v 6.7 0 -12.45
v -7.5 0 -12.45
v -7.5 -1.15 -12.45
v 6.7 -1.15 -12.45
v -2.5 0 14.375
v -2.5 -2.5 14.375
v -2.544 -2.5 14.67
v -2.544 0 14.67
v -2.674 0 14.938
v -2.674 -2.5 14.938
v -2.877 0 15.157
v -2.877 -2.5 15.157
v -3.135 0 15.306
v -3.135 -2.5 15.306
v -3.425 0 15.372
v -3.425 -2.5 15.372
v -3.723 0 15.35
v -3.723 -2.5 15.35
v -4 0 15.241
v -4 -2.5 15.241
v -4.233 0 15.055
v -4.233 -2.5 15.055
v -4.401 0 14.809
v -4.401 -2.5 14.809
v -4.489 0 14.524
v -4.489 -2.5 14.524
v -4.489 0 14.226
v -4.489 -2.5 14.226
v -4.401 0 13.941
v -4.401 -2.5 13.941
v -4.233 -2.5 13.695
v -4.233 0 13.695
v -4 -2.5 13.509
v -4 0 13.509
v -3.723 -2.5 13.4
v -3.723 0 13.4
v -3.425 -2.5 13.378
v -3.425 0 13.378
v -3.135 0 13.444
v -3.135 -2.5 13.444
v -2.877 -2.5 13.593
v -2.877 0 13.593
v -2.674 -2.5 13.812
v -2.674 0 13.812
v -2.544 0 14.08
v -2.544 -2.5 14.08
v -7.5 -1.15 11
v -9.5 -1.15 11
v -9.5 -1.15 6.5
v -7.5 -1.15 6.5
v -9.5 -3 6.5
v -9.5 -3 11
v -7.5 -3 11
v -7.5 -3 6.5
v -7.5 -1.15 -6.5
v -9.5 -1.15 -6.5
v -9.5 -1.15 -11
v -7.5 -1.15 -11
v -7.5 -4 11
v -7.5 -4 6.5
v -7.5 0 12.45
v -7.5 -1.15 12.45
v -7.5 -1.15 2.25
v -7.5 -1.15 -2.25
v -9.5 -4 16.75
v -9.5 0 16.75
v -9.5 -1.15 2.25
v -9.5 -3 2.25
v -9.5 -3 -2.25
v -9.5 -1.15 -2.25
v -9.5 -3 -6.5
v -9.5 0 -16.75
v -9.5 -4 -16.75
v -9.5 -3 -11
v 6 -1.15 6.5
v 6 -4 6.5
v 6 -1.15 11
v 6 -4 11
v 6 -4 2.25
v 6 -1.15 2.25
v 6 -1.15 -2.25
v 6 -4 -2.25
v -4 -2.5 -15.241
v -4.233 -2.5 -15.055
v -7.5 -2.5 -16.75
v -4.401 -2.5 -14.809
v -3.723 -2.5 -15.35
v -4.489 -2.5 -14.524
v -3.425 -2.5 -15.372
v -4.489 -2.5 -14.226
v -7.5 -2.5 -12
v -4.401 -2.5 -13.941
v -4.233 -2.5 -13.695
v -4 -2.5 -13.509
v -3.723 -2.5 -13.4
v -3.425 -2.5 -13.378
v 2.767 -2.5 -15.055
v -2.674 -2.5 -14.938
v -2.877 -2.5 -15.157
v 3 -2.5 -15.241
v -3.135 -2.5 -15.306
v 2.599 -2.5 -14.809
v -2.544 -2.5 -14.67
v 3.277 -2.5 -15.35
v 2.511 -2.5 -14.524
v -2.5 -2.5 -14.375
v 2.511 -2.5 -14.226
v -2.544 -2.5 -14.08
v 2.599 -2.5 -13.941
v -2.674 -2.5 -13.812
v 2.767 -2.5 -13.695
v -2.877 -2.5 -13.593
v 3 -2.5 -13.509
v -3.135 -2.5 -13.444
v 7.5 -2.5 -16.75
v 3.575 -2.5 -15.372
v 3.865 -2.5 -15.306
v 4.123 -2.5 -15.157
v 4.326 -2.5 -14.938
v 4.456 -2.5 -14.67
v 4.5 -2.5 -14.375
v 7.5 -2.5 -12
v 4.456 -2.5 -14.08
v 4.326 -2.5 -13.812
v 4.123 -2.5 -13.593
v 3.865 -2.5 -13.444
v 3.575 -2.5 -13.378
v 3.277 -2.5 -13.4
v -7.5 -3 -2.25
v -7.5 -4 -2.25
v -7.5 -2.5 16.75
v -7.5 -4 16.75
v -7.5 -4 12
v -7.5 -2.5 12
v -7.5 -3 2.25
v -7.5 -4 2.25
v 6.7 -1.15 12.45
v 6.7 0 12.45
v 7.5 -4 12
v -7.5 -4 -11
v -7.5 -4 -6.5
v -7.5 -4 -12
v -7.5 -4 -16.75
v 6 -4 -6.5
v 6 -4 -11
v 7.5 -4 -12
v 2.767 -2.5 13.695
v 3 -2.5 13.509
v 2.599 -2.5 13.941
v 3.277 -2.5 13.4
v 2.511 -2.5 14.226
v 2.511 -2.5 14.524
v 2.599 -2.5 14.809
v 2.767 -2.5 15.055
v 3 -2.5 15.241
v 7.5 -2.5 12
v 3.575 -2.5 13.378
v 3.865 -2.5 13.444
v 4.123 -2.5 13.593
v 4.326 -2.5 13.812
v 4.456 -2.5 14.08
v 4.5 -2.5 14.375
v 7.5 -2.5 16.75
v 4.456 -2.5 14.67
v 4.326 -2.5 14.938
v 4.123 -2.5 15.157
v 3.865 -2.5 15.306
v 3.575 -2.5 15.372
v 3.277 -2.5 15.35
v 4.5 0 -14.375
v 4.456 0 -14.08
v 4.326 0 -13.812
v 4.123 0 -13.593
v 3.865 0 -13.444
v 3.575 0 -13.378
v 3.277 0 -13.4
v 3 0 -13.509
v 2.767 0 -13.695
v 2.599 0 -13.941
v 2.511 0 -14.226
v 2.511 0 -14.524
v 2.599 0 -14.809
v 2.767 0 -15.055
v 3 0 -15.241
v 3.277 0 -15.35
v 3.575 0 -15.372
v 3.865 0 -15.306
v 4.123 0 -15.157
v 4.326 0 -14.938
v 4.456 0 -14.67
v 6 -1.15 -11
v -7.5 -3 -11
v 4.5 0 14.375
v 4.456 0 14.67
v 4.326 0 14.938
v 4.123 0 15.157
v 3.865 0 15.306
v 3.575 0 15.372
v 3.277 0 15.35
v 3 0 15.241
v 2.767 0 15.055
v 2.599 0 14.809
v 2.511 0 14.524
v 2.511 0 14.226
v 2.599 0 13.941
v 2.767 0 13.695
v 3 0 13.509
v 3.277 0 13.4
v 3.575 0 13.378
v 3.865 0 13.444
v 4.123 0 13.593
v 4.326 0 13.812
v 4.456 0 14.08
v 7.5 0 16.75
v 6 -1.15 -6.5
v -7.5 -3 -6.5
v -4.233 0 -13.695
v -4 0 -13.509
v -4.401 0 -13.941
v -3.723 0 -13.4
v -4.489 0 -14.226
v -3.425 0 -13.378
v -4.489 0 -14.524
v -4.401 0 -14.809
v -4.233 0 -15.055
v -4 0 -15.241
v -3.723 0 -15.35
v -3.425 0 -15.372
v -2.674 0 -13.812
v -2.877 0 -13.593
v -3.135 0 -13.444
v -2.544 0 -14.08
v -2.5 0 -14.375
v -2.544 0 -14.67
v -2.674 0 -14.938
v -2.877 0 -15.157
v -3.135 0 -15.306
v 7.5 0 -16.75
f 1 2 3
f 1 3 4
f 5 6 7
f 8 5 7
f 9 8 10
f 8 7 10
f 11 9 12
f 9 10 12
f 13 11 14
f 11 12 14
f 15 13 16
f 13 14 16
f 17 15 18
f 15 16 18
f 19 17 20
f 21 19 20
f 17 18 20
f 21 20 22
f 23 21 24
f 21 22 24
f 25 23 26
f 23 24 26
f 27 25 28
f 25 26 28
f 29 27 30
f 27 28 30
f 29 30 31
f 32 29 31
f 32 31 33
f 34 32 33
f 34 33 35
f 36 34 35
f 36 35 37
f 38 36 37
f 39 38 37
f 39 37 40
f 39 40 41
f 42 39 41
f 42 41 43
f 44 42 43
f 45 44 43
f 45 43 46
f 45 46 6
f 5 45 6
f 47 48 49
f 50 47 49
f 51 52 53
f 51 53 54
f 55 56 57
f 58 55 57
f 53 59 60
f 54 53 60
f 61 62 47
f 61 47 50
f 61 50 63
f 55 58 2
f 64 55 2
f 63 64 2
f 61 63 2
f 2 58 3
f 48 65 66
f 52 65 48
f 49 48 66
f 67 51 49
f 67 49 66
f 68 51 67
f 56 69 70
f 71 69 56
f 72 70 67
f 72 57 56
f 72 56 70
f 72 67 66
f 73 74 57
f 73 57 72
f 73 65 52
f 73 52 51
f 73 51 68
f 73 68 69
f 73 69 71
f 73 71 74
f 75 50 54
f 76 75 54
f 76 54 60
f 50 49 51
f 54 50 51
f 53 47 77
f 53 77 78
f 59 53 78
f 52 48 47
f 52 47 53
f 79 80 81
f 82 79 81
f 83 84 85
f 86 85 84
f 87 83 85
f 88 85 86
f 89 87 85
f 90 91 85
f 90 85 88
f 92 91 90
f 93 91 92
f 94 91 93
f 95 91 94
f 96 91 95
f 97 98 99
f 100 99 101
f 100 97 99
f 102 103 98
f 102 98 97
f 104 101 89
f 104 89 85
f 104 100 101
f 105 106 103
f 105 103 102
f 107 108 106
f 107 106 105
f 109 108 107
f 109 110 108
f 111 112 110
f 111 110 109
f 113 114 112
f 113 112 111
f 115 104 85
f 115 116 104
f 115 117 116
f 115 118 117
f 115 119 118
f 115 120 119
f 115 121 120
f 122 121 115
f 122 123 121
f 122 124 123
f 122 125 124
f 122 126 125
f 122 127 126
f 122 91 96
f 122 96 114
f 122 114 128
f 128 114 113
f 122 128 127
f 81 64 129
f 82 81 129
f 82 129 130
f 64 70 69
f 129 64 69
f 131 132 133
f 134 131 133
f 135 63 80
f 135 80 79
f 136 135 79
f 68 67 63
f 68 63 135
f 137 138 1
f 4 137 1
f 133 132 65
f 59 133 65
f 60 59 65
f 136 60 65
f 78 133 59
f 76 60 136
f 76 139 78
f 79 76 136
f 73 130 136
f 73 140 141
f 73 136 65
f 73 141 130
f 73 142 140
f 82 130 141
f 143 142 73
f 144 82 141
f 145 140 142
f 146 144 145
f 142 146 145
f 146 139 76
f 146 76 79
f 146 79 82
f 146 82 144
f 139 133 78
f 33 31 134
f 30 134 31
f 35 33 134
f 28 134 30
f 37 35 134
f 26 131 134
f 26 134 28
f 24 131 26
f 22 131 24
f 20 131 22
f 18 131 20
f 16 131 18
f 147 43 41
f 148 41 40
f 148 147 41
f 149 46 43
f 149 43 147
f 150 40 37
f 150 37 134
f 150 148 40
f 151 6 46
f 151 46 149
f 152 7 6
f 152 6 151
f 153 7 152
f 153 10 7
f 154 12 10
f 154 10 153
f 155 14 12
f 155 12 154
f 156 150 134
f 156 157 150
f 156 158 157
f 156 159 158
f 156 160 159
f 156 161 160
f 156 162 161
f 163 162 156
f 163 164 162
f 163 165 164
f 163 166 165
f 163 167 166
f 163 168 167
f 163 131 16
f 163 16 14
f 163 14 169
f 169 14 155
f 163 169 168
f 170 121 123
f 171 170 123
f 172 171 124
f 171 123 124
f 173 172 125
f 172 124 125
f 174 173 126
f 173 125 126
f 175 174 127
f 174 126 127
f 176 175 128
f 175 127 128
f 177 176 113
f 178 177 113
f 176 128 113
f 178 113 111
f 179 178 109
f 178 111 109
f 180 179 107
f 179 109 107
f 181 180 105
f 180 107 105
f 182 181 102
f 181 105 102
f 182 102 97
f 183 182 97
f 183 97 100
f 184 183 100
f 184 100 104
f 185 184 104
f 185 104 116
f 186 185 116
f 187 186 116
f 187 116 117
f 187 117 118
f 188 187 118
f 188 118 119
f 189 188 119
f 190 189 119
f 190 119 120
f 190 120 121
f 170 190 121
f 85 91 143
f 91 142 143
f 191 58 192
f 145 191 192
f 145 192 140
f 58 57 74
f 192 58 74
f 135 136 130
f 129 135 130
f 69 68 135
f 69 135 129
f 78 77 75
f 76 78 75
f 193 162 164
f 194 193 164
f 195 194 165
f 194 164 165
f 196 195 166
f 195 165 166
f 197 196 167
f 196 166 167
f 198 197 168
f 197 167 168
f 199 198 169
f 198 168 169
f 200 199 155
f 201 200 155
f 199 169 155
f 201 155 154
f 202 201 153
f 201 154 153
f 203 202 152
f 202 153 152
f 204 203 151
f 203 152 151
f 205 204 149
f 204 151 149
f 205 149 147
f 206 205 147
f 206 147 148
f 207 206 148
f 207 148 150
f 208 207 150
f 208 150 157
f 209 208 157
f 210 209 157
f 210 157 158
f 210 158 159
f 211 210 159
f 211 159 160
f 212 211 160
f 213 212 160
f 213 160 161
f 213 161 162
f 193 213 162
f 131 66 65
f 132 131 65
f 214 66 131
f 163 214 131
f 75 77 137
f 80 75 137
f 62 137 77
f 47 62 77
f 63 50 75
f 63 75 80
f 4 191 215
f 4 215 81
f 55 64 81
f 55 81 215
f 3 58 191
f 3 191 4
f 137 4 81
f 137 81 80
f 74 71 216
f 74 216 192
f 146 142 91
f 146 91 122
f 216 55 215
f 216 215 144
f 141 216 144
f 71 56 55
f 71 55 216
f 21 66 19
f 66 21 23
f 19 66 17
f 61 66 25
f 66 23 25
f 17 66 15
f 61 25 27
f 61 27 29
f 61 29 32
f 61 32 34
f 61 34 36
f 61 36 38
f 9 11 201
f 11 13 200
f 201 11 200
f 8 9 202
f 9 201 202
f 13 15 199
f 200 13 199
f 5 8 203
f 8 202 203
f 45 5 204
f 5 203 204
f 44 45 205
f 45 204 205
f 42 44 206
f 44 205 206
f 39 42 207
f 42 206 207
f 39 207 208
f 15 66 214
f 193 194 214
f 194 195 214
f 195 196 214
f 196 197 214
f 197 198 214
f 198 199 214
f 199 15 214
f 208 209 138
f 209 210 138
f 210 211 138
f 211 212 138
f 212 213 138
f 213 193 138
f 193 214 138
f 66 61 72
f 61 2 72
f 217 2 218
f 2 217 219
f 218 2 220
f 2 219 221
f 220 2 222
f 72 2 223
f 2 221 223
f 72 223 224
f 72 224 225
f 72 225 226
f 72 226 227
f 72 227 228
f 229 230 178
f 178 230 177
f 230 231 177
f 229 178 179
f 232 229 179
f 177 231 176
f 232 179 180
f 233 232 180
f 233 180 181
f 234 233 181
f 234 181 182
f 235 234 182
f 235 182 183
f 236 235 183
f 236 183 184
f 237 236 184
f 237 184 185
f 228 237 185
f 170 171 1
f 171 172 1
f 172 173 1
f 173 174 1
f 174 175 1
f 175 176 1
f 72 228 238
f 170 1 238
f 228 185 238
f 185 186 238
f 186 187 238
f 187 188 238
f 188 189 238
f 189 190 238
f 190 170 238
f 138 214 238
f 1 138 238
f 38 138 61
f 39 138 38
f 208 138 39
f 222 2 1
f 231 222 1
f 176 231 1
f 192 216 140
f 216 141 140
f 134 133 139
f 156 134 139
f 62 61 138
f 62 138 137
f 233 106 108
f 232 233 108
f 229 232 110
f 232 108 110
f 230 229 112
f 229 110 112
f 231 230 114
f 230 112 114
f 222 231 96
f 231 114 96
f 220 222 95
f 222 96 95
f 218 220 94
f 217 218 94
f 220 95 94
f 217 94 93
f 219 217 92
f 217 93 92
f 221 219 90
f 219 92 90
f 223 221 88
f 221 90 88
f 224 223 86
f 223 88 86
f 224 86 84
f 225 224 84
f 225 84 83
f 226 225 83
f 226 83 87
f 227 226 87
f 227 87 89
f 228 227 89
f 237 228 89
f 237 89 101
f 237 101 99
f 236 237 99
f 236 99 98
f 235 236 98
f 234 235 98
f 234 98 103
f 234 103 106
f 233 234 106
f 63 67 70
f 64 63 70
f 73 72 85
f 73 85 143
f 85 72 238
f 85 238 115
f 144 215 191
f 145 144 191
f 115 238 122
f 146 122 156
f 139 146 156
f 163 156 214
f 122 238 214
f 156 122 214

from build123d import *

# Parameters (mm, degrees)
SKETCH_W        = 15
SKETCH_H        = 33.5
PAD_DEPTH       = 12
SKETCH001_R     = 1
POCKET_DEPTH    = 12.001
SKETCH002_W     = 24.931972
SKETCH002_H     = 6.15048
SKETCH002_W_2   = 25.150666
SKETCH002_H_2   = 6.153969
POCKET001_DEPTH = 9.5
SKETCH003_W     = 17.12865
SKETCH003_H     = 22.5
POCKET002_DEPTH = 1
SKETCH004_W     = 20.925805
SKETCH004_H     = 24.9
POCKET003_DEPTH = 0.5
SKETCH005_W     = 29.02304
SKETCH005_H     = 9.956954
POCKET004_DEPTH = 15.001
SKETCH006_W     = 24.9
SKETCH006_H     = 4.282043
POCKET005_DEPTH = 14.2
SKETCH007_W     = 15.383407
SKETCH007_H     = 4.5
POCKET006_DEPTH = 2.851
SKETCH008_W     = 33.5
SKETCH008_H     = 4
PAD001_DEPTH    = 2
SKETCH009_W     = 4.5
SKETCH009_H     = 1.85
POCKET007_DEPTH = 2


with BuildPart() as part:
    # Sketch → Pad (new body)
    with BuildSketch(Plane.XZ):
        Rectangle(SKETCH_W, SKETCH_H)
    extrude(amount=PAD_DEPTH)

    # Sketch001 (on Face6 of Pad) → Pocket (cut, through all)
    with BuildSketch(Plane.XZ.offset(12)):
        with Locations((-3.5, 14.375)):
            Circle(SKETCH001_R)
        with Locations((3.5, 14.375)):
            Circle(SKETCH001_R)
        with Locations((-3.5, -14.375)):
            Circle(SKETCH001_R)
        with Locations((3.5, -14.375)):
            Circle(SKETCH001_R)
    extrude(amount=-POCKET_DEPTH, mode=Mode.SUBTRACT)

    # Sketch002 (on Face5 of Pocket) → Pocket001 (cut)
    with BuildSketch(Plane.XZ.offset(12)):
        with Locations((0.203806, 15.07524)):
            Rectangle(SKETCH002_W, SKETCH002_H)
        with Locations((0.641204, -15.0769845)):
            Rectangle(SKETCH002_W_2, SKETCH002_H_2)
    extrude(amount=-POCKET001_DEPTH, mode=Mode.SUBTRACT)

    # Sketch003 (on Face2 of Pocket001) → Pocket002 (cut)
    with BuildSketch(Plane(origin=(0, 0, 0), x_dir=(1, 0, 0), z_dir=(0, 1, 0))):
        with Locations((-3.064325, 0)):
            Rectangle(SKETCH003_W, SKETCH003_H)
    extrude(amount=-POCKET002_DEPTH, mode=Mode.SUBTRACT)

    # Sketch004 (on Face2 of Pocket002) → Pocket003 (cut)
    with BuildSketch(Plane(origin=(0, 0, 0), x_dir=(1, 0, 0), z_dir=(0, 1, 0))):
        with Locations((-3.7629025, 0)):
            Rectangle(SKETCH004_W, SKETCH004_H)
    extrude(amount=-POCKET003_DEPTH, mode=Mode.SUBTRACT)

    # Sketch005 (on Face1 of Pocket003) → Pocket004 (cut, through all)
    with BuildSketch(Plane(origin=(-7.5, 0, 0), x_dir=(0, 0, -1), z_dir=(-1, 0, 0))):
        with Locations((0.508849, 8.978477)):
            Rectangle(SKETCH005_W, SKETCH005_H)
    extrude(amount=-POCKET004_DEPTH, mode=Mode.SUBTRACT)

    # Sketch006 (on Face1 of Pocket004) → Pocket005 (cut)
    with BuildSketch(Plane(origin=(-7.5, 0, 0), x_dir=(0, 0, -1), z_dir=(-1, 0, 0))):
        with Locations((0, -0.9910215)):
            Rectangle(SKETCH006_W, SKETCH006_H)
    extrude(amount=-POCKET005_DEPTH, mode=Mode.SUBTRACT)

    # Sketch007 (on Face5 of Pocket005) → Pocket006 (cut, through all)
    with BuildSketch(Plane(origin=(0, -1.15, 0), x_dir=(1, 0, 0), z_dir=(0, 1, 0))):
        with Locations((-1.6917035, 8.75)):
            Rectangle(SKETCH007_W, SKETCH007_H)
        with Locations((-1.6917035, 0)):
            Rectangle(SKETCH007_W, SKETCH007_H)
        with Locations((-1.6917035, -8.75)):
            Rectangle(SKETCH007_W, SKETCH007_H)
    extrude(amount=-POCKET006_DEPTH, mode=Mode.SUBTRACT)

    # Sketch008 (on Face13 of Pocket006) → Pad001 (join)
    with BuildSketch(Plane(origin=(-7.5, 0, 0), x_dir=(0, 0, -1), z_dir=(-1, 0, 0))):
        with Locations((0, 2)):
            Rectangle(SKETCH008_W, SKETCH008_H)
    extrude(amount=PAD001_DEPTH)

    # Sketch009 (on Face16 of Pad001) → Pocket007 (cut)
    with BuildSketch(Plane(origin=(-9.5, 0, 0), x_dir=(0, 0, -1), z_dir=(-1, 0, 0))):
        with Locations((-8.75, 2.075)):
            Rectangle(SKETCH009_W, SKETCH009_H)
        with Locations((0, 2.075)):
            Rectangle(SKETCH009_W, SKETCH009_H)
        with Locations((8.75, 2.075)):
            Rectangle(SKETCH009_W, SKETCH009_H)
    extrude(amount=-POCKET007_DEPTH, mode=Mode.SUBTRACT)


solid = part.part
